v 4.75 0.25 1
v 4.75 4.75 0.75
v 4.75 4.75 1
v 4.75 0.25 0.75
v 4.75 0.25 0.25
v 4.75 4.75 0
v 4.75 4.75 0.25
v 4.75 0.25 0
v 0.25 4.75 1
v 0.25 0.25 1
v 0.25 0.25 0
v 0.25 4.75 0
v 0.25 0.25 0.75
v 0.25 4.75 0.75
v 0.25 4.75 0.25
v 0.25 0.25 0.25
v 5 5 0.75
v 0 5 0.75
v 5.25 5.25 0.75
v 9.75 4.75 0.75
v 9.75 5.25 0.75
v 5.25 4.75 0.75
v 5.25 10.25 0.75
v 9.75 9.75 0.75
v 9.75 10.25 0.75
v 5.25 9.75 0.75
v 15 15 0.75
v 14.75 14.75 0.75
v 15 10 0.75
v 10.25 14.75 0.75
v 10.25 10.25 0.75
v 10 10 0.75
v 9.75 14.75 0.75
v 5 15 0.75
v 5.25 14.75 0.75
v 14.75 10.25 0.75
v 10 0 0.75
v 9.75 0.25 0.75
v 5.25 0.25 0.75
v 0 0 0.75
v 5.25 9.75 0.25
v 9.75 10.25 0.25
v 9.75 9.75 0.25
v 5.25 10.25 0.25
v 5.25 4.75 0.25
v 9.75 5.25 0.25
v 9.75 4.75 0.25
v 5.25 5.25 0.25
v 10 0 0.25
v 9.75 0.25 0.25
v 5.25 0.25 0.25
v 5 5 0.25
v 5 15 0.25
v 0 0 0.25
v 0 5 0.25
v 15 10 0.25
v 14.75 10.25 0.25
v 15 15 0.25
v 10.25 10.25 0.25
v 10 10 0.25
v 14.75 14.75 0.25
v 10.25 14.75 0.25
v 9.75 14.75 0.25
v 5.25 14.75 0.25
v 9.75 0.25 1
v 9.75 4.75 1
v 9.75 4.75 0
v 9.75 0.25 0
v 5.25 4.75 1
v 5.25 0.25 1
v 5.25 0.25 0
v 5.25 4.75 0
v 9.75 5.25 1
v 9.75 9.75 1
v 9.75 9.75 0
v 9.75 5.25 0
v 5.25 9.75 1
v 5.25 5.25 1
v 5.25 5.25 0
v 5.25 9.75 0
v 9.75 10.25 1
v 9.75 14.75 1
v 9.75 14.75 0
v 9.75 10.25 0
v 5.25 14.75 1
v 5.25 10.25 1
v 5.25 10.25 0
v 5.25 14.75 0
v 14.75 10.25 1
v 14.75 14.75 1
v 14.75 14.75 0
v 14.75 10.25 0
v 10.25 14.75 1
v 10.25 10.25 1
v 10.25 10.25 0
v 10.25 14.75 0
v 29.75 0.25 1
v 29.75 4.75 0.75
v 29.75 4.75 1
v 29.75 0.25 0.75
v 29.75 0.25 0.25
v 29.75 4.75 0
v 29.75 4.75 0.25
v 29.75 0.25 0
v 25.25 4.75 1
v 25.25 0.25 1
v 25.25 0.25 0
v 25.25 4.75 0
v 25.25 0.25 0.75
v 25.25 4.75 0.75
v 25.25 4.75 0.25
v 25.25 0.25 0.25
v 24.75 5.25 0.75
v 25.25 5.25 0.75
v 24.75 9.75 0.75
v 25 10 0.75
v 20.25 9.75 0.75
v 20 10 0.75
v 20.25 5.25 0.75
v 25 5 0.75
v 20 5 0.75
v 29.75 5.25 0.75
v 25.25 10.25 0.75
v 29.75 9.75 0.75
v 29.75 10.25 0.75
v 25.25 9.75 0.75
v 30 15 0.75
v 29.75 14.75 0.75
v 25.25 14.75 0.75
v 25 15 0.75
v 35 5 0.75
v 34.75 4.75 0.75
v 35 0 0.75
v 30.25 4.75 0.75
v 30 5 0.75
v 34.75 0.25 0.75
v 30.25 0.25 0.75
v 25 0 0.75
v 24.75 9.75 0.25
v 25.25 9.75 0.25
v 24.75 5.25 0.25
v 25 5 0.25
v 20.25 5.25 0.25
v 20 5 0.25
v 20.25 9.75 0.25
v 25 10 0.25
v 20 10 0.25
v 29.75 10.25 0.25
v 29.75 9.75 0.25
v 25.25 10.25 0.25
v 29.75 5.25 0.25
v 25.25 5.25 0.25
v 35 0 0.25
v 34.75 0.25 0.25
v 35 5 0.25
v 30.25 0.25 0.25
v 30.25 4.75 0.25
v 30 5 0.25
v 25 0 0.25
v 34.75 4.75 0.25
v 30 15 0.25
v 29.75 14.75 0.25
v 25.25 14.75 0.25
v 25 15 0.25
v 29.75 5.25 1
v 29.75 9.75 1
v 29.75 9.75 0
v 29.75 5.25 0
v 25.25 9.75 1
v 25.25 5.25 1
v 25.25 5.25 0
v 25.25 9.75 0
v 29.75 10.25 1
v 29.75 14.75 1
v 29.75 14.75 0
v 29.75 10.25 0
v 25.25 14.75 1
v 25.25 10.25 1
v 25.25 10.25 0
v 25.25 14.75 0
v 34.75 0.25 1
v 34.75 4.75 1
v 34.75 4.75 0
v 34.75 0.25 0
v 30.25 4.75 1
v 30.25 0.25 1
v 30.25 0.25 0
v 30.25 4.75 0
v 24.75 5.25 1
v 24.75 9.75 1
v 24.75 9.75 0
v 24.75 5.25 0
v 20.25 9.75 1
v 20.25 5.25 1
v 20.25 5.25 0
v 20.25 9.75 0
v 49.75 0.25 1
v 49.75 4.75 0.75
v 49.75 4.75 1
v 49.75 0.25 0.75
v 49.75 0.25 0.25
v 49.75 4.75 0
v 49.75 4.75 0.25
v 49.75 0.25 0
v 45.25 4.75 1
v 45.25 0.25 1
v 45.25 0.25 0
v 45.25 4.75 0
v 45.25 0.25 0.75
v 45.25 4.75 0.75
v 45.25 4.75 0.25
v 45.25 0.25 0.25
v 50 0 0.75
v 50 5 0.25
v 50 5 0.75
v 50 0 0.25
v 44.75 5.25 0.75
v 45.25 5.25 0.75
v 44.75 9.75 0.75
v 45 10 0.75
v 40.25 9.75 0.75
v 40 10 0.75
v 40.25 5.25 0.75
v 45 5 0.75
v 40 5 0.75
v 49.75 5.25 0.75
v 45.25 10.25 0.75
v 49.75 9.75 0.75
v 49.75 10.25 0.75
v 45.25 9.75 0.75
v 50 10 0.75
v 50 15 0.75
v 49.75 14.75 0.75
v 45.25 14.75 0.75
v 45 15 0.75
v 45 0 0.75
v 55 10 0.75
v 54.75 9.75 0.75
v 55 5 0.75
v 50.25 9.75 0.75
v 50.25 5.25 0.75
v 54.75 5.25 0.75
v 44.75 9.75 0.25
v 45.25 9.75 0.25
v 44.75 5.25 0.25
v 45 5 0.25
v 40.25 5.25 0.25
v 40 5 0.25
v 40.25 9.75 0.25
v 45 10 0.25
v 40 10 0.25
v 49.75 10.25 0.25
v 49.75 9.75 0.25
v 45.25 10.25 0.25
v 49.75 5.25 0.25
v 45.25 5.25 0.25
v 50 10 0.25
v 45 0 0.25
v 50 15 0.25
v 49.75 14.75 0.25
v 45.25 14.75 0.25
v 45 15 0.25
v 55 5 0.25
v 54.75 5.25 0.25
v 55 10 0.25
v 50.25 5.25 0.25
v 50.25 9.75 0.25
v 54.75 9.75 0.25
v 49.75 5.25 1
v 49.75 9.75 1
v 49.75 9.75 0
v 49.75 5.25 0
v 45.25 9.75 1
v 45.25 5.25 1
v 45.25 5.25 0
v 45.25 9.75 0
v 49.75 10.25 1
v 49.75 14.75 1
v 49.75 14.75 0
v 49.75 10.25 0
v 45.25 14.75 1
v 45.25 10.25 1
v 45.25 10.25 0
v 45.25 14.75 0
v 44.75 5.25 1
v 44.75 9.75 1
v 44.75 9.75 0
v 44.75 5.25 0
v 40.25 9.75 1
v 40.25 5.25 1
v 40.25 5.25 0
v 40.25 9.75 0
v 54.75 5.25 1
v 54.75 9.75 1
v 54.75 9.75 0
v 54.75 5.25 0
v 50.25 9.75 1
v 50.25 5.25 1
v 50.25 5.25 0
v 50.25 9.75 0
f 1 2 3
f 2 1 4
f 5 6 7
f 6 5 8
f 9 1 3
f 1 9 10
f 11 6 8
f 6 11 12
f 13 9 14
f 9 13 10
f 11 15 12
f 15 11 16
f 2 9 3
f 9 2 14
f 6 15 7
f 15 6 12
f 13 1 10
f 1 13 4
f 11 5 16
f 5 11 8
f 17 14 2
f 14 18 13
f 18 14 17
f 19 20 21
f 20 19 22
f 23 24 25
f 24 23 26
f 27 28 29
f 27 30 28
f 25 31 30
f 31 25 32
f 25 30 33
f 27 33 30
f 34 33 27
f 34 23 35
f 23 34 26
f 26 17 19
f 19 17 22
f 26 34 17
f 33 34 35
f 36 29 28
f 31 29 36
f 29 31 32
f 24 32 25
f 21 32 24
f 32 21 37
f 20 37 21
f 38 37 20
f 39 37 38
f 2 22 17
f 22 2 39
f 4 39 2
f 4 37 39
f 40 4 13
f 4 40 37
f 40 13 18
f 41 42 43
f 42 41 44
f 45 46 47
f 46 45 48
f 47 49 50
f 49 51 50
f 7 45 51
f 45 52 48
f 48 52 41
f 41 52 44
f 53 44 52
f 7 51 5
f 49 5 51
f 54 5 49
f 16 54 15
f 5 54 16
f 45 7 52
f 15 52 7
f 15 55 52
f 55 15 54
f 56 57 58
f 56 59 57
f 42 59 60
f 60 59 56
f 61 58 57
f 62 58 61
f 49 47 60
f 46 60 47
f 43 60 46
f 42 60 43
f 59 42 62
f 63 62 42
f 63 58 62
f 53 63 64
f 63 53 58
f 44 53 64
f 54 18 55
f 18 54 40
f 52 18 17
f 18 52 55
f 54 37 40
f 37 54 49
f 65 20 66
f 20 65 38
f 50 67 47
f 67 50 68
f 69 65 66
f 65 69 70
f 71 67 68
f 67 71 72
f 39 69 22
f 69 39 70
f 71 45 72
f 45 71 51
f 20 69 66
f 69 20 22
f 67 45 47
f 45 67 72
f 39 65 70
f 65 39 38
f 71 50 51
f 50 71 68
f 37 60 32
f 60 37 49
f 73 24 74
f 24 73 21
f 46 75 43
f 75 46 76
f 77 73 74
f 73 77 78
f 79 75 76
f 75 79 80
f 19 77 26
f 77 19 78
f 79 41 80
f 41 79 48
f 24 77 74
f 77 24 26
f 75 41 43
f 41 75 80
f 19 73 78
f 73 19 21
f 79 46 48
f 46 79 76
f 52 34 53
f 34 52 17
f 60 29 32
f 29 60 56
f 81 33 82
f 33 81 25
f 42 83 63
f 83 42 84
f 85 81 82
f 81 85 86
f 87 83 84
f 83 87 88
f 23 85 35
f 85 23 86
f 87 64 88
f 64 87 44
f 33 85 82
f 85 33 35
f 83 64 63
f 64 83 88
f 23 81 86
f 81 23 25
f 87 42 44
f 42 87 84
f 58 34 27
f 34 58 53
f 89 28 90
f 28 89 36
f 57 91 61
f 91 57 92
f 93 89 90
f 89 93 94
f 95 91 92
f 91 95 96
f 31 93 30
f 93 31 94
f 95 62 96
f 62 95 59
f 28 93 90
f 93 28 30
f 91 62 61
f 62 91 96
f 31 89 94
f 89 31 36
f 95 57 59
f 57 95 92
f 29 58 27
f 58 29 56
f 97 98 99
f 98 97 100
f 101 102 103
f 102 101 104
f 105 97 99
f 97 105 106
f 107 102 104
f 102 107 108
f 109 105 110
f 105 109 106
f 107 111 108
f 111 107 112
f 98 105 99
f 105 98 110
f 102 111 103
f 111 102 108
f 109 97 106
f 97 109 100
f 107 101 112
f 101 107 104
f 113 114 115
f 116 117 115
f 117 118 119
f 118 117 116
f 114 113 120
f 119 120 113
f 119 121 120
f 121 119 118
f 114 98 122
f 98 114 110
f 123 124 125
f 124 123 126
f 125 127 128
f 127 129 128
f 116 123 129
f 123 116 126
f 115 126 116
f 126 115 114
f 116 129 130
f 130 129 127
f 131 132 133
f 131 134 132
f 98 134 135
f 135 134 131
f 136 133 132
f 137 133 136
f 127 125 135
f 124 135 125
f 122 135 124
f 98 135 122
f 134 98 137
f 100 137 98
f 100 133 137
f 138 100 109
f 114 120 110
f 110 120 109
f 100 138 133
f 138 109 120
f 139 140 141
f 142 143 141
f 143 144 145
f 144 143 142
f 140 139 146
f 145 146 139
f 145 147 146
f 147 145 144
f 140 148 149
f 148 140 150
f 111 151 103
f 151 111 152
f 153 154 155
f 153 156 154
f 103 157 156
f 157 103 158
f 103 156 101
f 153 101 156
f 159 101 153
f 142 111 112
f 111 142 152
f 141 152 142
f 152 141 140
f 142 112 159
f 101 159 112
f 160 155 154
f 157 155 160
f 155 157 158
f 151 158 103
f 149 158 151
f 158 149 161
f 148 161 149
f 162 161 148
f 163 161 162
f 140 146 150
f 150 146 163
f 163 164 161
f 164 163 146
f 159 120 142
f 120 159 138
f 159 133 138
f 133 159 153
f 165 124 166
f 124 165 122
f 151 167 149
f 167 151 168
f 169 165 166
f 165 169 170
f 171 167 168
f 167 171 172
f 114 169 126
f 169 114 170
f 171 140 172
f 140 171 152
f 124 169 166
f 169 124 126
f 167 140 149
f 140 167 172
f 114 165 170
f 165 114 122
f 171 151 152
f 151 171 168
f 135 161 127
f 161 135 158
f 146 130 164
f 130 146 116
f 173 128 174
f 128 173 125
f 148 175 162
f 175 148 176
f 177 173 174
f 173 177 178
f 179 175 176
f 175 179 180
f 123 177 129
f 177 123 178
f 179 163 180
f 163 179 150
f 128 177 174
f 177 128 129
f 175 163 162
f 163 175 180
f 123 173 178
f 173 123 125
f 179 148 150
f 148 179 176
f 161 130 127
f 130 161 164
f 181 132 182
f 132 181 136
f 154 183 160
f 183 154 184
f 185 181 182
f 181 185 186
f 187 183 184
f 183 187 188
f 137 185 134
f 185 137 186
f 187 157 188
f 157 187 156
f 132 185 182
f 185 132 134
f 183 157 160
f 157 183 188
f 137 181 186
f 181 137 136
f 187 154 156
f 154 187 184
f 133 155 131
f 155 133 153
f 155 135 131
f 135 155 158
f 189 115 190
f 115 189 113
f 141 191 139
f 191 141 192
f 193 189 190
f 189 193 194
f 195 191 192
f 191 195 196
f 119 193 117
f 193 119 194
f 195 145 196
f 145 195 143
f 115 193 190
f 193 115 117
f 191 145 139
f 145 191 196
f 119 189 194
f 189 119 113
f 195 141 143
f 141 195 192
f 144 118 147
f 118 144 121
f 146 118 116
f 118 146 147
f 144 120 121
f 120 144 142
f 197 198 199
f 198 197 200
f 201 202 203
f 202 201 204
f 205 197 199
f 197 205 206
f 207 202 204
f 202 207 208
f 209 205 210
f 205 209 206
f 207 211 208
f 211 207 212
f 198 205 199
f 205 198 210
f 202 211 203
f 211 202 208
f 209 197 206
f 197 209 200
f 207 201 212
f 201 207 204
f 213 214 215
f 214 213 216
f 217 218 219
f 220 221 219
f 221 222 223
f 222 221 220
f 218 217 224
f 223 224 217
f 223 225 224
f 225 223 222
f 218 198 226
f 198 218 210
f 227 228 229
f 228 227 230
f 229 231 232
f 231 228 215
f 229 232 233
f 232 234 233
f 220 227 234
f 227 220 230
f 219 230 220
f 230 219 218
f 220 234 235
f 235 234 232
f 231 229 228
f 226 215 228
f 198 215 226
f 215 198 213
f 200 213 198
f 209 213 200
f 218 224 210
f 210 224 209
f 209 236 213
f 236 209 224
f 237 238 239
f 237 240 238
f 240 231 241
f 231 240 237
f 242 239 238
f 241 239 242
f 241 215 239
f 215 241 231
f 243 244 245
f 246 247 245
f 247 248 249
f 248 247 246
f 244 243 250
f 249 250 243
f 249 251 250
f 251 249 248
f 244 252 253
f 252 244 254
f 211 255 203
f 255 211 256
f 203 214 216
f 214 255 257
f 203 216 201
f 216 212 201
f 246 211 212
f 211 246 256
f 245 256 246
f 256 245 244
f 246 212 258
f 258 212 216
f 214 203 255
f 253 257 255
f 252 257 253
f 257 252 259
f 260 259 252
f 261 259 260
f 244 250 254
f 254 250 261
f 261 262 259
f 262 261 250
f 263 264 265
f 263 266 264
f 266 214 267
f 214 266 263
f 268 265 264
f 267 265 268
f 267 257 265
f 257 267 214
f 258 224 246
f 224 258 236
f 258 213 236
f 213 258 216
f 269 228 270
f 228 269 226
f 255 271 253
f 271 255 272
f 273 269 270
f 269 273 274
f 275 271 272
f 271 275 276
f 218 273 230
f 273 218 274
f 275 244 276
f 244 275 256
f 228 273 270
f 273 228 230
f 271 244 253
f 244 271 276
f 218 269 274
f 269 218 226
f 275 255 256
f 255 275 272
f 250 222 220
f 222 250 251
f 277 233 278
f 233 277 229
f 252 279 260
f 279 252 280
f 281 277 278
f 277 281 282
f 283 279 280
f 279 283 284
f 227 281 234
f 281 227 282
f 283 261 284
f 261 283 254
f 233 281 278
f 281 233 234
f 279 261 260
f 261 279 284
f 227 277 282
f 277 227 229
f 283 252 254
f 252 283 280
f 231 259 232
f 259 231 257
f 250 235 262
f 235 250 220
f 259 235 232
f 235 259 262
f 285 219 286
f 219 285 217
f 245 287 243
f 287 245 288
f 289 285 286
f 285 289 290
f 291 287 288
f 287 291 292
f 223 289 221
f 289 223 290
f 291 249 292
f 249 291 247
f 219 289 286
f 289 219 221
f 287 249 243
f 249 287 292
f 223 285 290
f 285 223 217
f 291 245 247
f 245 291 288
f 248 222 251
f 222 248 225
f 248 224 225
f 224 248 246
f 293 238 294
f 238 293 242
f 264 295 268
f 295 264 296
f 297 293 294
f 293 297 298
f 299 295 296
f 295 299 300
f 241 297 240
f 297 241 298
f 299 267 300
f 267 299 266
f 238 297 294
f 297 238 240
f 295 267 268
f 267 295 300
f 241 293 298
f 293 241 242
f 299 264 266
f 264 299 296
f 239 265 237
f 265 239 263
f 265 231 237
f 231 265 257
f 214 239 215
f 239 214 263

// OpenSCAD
// file: blokus.scad
// Side of one square.
width = 5;
// Height of the peices.
height = 1;
// Half the width of the grooves.
hg_width = 0.25;

// One block in the blokus peices.
module blokus_block(width=width, height=height, hg_width=hg_width) {
translate([hg_width, hg_width, 0]) 
cube([width-hg_width*2, width-hg_width*2, 1]);
translate([0, 0, hg_width]) 
cube([width, width, 1 - hg_width*2]);
}

// A Blokus peice created by a matrix with ones where the blocks are supposed to be.
module blokus_shape(shape) {
    b_height = len(shape);
    b_width = len(shape[0]);
    for(i = [0:b_height], j = [0:b_width]) {
        if(shape[i][j] == 1) {
            translate([width * j, width * i, 0])
            blokus_block(width,height);
        }
    }
}


shape_array = [[0,1,0],
               [0,1,0],
               [1,1,1]];

blokus_shape(shape_array);
// main file
use <blokus.scad>

module blokus_1() {
    shape_array = [[1]];
    blokus_shape(shape_array);
}
module blokus_2() {
    shape_array = [[1],
                   [1]];
    blokus_shape(shape_array);
}
module blokus_3() {
    shape_array = [[1],
                   [1],
                   [1]];
    blokus_shape(shape_array);
}
module blokus_crooked_3() {
    shape_array = [[1,0],
                   [1,1]];
    blokus_shape(shape_array);
}
module blokus_square() {
    shape_array = [[1,1],
                   [1,1]];
    blokus_shape(shape_array);
}
module blokus_short_Z() {
    shape_array = [[1,1,0],
                   [0,1,1]];
    blokus_shape(shape_array);
}
module blokus_short_L() {
    shape_array = [[1,0],
                   [1,0],
                   [1,1]];
    blokus_shape(shape_array);
}
module blokus_short_T() {
    shape_array = [[1,1,1],
                   [0,1,0]];
    blokus_shape(shape_array);
}
module blokus_short_I() {
    shape_array = [[1],
                   [1],
                   [1],
                   [1]];
    blokus_shape(shape_array);
}
module blokus_P() {
    shape_array = [[1,1],
                   [1,1],
                   [1,0]];
    blokus_shape(shape_array);
}
module blokus_Y() {
    shape_array = [[0,1,0,0],
                   [1,1,1,1]];
    blokus_shape(shape_array);
}
module blokus_N() {
    shape_array = [[0,1,1,1],
                   [1,1,0,0]];
    blokus_shape(shape_array);
}
module blokus_X() {
    shape_array = [[0,1,0],
                   [1,1,1],
                   [0,1,0]];
    blokus_shape(shape_array);
}
module blokus_W() {
    shape_array = [[0,0,1],
                   [0,1,1],
                   [1,1,0]];
    blokus_shape(shape_array);
}
module blokus_V() {
    shape_array = [[0,0,1],
                   [0,0,1],
                   [1,1,1]];
    blokus_shape(shape_array);
}
module blokus_F() {
    shape_array = [[0,1,0],
                   [0,1,0],
                   [1,1,1]];
    blokus_shape(shape_array);
}
module blokus_T() {
    shape_array = [[0,1,1],
                   [1,1,0],
                   [0,1,0]];
    blokus_shape(shape_array);
}
module blokus_Z() {
    shape_array = [[1,1,0],
                   [0,1,0],
                   [0,1,1]];
    blokus_shape(shape_array);
}
module blokus_U() {
    shape_array = [[1,0,1],
                   [1,1,1]];
    blokus_shape(shape_array);
}
module blokus_L() {
    shape_array = [[1,0],
                   [1,0],
                   [1,0],
                   [1,1]];
    blokus_shape(shape_array);
}
module blokus_I() {
    shape_array = [[1],
                   [1],
                   [1],
                   [1],
                   [1]];
    blokus_shape(shape_array);
}

blokus_Z();
translate([20,0,0])
blokus_T();
translate([40,0,0])
blokus_X();
